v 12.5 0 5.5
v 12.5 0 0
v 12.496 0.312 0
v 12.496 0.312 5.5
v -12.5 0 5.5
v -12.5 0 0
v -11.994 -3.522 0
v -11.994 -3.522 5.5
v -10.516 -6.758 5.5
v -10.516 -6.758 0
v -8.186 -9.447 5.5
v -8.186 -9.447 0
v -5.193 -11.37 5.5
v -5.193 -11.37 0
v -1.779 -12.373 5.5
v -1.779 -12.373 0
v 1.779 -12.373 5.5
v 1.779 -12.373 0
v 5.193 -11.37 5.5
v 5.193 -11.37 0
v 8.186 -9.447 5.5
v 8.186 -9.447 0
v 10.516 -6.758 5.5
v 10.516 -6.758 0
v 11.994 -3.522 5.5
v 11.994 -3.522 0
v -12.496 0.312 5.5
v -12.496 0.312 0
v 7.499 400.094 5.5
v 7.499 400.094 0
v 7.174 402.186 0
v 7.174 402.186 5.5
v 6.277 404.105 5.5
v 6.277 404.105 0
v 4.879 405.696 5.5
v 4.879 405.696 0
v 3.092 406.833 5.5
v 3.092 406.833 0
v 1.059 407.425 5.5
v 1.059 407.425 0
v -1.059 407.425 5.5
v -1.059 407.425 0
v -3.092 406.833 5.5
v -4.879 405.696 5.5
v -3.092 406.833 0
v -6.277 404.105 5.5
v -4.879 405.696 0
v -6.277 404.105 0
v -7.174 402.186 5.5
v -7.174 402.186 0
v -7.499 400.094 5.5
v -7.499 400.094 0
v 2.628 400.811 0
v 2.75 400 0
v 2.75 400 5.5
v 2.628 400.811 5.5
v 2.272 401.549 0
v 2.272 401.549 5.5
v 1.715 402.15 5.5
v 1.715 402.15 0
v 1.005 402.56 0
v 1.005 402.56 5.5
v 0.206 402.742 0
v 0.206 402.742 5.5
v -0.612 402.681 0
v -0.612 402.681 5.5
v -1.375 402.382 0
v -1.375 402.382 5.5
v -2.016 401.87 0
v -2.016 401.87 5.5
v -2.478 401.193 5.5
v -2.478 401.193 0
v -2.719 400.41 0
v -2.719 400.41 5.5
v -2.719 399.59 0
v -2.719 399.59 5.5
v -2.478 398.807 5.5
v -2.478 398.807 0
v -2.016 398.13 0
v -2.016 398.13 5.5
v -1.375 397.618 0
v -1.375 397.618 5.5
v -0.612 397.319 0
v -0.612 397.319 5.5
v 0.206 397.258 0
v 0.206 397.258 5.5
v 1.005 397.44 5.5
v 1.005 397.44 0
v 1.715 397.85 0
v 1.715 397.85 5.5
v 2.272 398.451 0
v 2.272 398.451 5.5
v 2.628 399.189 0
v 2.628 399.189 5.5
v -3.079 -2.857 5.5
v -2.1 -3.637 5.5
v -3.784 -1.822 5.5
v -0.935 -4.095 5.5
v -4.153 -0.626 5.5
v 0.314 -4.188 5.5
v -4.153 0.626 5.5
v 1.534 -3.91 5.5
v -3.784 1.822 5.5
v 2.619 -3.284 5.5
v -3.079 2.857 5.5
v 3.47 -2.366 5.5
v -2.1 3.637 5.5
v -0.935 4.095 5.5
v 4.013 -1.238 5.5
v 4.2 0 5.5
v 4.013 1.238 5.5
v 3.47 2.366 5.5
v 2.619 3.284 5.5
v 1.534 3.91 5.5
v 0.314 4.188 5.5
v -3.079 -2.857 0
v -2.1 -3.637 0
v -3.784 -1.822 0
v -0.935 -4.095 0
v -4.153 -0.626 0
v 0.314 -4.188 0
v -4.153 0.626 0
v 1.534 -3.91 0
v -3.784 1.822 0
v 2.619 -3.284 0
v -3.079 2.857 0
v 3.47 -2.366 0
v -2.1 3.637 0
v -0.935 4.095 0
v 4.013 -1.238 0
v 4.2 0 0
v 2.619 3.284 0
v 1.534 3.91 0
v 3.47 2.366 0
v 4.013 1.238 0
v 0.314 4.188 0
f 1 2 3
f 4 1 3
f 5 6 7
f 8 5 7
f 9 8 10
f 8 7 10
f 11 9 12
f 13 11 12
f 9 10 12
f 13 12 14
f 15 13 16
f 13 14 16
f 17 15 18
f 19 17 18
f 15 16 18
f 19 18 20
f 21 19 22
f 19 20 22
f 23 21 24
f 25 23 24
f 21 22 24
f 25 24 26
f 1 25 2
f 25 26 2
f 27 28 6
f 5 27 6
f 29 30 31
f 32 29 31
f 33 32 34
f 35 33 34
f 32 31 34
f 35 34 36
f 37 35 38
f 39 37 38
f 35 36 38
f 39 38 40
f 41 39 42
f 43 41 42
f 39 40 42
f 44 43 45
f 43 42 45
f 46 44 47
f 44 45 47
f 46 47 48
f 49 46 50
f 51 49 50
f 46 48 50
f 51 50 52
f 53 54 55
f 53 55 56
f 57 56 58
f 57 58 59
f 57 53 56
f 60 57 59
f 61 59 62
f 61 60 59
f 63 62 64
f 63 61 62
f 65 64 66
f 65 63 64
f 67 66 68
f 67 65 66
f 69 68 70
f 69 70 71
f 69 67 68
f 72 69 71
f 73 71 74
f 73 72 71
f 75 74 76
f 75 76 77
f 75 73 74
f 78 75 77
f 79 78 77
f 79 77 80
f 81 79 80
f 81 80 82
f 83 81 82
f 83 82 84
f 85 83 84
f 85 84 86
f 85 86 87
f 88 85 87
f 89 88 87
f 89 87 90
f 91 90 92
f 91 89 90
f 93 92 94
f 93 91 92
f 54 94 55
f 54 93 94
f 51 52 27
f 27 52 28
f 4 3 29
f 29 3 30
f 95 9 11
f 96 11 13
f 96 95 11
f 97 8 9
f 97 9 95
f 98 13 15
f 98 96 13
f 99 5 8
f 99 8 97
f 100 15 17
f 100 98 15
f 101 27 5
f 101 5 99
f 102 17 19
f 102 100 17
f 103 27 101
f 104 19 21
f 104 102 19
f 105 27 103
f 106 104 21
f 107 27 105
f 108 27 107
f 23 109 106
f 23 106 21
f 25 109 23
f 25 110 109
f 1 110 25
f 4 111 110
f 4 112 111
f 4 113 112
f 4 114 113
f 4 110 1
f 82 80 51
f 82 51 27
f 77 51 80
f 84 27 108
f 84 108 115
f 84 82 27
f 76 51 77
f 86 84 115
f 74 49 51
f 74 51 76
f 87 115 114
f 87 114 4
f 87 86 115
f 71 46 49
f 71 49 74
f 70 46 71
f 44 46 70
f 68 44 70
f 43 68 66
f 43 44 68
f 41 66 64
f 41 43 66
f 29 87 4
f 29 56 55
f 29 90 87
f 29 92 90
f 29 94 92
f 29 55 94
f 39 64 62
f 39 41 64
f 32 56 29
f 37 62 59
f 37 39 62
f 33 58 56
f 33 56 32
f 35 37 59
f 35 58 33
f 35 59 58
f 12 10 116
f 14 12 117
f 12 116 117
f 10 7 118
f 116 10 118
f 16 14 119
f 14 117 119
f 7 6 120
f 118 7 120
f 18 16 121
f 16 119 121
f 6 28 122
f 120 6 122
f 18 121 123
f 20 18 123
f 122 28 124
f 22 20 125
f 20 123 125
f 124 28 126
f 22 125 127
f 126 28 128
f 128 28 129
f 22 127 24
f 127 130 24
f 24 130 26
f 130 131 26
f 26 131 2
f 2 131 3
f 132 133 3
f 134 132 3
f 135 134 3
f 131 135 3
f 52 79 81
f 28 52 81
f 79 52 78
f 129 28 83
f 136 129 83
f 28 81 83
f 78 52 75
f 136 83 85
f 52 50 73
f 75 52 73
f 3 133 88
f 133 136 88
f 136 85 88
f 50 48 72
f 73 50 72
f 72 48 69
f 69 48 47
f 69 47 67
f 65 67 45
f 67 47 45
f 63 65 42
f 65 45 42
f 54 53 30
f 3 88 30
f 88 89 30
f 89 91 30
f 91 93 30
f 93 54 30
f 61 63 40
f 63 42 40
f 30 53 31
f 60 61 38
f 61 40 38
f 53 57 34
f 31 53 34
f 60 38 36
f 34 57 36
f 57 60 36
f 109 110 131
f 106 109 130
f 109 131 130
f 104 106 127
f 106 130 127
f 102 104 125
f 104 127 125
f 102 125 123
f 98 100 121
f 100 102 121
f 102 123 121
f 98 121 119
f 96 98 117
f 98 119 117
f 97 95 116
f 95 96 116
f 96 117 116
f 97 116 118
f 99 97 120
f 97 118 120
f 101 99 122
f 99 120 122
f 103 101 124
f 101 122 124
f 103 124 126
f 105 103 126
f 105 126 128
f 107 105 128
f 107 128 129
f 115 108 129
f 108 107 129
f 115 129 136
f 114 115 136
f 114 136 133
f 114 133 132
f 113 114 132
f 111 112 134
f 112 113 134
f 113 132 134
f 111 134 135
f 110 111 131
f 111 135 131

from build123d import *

# Parameters (mm, degrees)
SKETCH1_R           = 2.75
BOSS_EXTRUDE1_DEPTH = 5.5


with BuildPart() as part:
    # Sketch1 → Boss-Extrude1 (new body)
    # profile 1 of 3: a face of its own
    with BuildSketch(Plane.XY):
        with BuildLine():
            ThreePointArc((-12.496095275, 0.312414586), (0, 12.5), (12.496095275, 0.312414586))
            Line((12.496095275, 0.312414586), (7.499414268, 400.093731696))
            ThreePointArc((7.499414268, 400.093731696), (0, 407.5), (-7.499414268, 400.093731696))
            Line((-7.499414268, 400.093731696), (-12.496095275, 0.312414586))
        make_face()
        with Locations((0, 400)):
            Circle(SKETCH1_R, mode=Mode.SUBTRACT)
    # profile 2 of 3: a face of its own
    with BuildSketch(Plane.XY):
        with BuildLine():
            ThreePointArc((-4.2, 0), (0, 4.2), (4.2, 0))
            Line((4.2, 0), (12.5, 0))
            Line((12.5, 0), (12.496095275, 0.312414586))
            ThreePointArc((12.496095275, 0.312414586), (0, 12.5), (-12.496095275, 0.312414586))
            Line((-12.496095275, 0.312414586), (-12.5, 0))
            Line((-12.5, 0), (-4.2, 0))
        make_face()
    # profile 3 of 3: a face of its own
    with BuildSketch(Plane.XY):
        with BuildLine():
            Line((12.5, 0), (4.2, 0))
            ThreePointArc((4.2, 0), (0, -4.2), (-4.2, 0))
            Line((-4.2, 0), (-12.5, 0))
            ThreePointArc((-12.5, 0), (0, -12.5), (12.5, 0))
        make_face()
    extrude(amount=BOSS_EXTRUDE1_DEPTH)


solid = part.part
